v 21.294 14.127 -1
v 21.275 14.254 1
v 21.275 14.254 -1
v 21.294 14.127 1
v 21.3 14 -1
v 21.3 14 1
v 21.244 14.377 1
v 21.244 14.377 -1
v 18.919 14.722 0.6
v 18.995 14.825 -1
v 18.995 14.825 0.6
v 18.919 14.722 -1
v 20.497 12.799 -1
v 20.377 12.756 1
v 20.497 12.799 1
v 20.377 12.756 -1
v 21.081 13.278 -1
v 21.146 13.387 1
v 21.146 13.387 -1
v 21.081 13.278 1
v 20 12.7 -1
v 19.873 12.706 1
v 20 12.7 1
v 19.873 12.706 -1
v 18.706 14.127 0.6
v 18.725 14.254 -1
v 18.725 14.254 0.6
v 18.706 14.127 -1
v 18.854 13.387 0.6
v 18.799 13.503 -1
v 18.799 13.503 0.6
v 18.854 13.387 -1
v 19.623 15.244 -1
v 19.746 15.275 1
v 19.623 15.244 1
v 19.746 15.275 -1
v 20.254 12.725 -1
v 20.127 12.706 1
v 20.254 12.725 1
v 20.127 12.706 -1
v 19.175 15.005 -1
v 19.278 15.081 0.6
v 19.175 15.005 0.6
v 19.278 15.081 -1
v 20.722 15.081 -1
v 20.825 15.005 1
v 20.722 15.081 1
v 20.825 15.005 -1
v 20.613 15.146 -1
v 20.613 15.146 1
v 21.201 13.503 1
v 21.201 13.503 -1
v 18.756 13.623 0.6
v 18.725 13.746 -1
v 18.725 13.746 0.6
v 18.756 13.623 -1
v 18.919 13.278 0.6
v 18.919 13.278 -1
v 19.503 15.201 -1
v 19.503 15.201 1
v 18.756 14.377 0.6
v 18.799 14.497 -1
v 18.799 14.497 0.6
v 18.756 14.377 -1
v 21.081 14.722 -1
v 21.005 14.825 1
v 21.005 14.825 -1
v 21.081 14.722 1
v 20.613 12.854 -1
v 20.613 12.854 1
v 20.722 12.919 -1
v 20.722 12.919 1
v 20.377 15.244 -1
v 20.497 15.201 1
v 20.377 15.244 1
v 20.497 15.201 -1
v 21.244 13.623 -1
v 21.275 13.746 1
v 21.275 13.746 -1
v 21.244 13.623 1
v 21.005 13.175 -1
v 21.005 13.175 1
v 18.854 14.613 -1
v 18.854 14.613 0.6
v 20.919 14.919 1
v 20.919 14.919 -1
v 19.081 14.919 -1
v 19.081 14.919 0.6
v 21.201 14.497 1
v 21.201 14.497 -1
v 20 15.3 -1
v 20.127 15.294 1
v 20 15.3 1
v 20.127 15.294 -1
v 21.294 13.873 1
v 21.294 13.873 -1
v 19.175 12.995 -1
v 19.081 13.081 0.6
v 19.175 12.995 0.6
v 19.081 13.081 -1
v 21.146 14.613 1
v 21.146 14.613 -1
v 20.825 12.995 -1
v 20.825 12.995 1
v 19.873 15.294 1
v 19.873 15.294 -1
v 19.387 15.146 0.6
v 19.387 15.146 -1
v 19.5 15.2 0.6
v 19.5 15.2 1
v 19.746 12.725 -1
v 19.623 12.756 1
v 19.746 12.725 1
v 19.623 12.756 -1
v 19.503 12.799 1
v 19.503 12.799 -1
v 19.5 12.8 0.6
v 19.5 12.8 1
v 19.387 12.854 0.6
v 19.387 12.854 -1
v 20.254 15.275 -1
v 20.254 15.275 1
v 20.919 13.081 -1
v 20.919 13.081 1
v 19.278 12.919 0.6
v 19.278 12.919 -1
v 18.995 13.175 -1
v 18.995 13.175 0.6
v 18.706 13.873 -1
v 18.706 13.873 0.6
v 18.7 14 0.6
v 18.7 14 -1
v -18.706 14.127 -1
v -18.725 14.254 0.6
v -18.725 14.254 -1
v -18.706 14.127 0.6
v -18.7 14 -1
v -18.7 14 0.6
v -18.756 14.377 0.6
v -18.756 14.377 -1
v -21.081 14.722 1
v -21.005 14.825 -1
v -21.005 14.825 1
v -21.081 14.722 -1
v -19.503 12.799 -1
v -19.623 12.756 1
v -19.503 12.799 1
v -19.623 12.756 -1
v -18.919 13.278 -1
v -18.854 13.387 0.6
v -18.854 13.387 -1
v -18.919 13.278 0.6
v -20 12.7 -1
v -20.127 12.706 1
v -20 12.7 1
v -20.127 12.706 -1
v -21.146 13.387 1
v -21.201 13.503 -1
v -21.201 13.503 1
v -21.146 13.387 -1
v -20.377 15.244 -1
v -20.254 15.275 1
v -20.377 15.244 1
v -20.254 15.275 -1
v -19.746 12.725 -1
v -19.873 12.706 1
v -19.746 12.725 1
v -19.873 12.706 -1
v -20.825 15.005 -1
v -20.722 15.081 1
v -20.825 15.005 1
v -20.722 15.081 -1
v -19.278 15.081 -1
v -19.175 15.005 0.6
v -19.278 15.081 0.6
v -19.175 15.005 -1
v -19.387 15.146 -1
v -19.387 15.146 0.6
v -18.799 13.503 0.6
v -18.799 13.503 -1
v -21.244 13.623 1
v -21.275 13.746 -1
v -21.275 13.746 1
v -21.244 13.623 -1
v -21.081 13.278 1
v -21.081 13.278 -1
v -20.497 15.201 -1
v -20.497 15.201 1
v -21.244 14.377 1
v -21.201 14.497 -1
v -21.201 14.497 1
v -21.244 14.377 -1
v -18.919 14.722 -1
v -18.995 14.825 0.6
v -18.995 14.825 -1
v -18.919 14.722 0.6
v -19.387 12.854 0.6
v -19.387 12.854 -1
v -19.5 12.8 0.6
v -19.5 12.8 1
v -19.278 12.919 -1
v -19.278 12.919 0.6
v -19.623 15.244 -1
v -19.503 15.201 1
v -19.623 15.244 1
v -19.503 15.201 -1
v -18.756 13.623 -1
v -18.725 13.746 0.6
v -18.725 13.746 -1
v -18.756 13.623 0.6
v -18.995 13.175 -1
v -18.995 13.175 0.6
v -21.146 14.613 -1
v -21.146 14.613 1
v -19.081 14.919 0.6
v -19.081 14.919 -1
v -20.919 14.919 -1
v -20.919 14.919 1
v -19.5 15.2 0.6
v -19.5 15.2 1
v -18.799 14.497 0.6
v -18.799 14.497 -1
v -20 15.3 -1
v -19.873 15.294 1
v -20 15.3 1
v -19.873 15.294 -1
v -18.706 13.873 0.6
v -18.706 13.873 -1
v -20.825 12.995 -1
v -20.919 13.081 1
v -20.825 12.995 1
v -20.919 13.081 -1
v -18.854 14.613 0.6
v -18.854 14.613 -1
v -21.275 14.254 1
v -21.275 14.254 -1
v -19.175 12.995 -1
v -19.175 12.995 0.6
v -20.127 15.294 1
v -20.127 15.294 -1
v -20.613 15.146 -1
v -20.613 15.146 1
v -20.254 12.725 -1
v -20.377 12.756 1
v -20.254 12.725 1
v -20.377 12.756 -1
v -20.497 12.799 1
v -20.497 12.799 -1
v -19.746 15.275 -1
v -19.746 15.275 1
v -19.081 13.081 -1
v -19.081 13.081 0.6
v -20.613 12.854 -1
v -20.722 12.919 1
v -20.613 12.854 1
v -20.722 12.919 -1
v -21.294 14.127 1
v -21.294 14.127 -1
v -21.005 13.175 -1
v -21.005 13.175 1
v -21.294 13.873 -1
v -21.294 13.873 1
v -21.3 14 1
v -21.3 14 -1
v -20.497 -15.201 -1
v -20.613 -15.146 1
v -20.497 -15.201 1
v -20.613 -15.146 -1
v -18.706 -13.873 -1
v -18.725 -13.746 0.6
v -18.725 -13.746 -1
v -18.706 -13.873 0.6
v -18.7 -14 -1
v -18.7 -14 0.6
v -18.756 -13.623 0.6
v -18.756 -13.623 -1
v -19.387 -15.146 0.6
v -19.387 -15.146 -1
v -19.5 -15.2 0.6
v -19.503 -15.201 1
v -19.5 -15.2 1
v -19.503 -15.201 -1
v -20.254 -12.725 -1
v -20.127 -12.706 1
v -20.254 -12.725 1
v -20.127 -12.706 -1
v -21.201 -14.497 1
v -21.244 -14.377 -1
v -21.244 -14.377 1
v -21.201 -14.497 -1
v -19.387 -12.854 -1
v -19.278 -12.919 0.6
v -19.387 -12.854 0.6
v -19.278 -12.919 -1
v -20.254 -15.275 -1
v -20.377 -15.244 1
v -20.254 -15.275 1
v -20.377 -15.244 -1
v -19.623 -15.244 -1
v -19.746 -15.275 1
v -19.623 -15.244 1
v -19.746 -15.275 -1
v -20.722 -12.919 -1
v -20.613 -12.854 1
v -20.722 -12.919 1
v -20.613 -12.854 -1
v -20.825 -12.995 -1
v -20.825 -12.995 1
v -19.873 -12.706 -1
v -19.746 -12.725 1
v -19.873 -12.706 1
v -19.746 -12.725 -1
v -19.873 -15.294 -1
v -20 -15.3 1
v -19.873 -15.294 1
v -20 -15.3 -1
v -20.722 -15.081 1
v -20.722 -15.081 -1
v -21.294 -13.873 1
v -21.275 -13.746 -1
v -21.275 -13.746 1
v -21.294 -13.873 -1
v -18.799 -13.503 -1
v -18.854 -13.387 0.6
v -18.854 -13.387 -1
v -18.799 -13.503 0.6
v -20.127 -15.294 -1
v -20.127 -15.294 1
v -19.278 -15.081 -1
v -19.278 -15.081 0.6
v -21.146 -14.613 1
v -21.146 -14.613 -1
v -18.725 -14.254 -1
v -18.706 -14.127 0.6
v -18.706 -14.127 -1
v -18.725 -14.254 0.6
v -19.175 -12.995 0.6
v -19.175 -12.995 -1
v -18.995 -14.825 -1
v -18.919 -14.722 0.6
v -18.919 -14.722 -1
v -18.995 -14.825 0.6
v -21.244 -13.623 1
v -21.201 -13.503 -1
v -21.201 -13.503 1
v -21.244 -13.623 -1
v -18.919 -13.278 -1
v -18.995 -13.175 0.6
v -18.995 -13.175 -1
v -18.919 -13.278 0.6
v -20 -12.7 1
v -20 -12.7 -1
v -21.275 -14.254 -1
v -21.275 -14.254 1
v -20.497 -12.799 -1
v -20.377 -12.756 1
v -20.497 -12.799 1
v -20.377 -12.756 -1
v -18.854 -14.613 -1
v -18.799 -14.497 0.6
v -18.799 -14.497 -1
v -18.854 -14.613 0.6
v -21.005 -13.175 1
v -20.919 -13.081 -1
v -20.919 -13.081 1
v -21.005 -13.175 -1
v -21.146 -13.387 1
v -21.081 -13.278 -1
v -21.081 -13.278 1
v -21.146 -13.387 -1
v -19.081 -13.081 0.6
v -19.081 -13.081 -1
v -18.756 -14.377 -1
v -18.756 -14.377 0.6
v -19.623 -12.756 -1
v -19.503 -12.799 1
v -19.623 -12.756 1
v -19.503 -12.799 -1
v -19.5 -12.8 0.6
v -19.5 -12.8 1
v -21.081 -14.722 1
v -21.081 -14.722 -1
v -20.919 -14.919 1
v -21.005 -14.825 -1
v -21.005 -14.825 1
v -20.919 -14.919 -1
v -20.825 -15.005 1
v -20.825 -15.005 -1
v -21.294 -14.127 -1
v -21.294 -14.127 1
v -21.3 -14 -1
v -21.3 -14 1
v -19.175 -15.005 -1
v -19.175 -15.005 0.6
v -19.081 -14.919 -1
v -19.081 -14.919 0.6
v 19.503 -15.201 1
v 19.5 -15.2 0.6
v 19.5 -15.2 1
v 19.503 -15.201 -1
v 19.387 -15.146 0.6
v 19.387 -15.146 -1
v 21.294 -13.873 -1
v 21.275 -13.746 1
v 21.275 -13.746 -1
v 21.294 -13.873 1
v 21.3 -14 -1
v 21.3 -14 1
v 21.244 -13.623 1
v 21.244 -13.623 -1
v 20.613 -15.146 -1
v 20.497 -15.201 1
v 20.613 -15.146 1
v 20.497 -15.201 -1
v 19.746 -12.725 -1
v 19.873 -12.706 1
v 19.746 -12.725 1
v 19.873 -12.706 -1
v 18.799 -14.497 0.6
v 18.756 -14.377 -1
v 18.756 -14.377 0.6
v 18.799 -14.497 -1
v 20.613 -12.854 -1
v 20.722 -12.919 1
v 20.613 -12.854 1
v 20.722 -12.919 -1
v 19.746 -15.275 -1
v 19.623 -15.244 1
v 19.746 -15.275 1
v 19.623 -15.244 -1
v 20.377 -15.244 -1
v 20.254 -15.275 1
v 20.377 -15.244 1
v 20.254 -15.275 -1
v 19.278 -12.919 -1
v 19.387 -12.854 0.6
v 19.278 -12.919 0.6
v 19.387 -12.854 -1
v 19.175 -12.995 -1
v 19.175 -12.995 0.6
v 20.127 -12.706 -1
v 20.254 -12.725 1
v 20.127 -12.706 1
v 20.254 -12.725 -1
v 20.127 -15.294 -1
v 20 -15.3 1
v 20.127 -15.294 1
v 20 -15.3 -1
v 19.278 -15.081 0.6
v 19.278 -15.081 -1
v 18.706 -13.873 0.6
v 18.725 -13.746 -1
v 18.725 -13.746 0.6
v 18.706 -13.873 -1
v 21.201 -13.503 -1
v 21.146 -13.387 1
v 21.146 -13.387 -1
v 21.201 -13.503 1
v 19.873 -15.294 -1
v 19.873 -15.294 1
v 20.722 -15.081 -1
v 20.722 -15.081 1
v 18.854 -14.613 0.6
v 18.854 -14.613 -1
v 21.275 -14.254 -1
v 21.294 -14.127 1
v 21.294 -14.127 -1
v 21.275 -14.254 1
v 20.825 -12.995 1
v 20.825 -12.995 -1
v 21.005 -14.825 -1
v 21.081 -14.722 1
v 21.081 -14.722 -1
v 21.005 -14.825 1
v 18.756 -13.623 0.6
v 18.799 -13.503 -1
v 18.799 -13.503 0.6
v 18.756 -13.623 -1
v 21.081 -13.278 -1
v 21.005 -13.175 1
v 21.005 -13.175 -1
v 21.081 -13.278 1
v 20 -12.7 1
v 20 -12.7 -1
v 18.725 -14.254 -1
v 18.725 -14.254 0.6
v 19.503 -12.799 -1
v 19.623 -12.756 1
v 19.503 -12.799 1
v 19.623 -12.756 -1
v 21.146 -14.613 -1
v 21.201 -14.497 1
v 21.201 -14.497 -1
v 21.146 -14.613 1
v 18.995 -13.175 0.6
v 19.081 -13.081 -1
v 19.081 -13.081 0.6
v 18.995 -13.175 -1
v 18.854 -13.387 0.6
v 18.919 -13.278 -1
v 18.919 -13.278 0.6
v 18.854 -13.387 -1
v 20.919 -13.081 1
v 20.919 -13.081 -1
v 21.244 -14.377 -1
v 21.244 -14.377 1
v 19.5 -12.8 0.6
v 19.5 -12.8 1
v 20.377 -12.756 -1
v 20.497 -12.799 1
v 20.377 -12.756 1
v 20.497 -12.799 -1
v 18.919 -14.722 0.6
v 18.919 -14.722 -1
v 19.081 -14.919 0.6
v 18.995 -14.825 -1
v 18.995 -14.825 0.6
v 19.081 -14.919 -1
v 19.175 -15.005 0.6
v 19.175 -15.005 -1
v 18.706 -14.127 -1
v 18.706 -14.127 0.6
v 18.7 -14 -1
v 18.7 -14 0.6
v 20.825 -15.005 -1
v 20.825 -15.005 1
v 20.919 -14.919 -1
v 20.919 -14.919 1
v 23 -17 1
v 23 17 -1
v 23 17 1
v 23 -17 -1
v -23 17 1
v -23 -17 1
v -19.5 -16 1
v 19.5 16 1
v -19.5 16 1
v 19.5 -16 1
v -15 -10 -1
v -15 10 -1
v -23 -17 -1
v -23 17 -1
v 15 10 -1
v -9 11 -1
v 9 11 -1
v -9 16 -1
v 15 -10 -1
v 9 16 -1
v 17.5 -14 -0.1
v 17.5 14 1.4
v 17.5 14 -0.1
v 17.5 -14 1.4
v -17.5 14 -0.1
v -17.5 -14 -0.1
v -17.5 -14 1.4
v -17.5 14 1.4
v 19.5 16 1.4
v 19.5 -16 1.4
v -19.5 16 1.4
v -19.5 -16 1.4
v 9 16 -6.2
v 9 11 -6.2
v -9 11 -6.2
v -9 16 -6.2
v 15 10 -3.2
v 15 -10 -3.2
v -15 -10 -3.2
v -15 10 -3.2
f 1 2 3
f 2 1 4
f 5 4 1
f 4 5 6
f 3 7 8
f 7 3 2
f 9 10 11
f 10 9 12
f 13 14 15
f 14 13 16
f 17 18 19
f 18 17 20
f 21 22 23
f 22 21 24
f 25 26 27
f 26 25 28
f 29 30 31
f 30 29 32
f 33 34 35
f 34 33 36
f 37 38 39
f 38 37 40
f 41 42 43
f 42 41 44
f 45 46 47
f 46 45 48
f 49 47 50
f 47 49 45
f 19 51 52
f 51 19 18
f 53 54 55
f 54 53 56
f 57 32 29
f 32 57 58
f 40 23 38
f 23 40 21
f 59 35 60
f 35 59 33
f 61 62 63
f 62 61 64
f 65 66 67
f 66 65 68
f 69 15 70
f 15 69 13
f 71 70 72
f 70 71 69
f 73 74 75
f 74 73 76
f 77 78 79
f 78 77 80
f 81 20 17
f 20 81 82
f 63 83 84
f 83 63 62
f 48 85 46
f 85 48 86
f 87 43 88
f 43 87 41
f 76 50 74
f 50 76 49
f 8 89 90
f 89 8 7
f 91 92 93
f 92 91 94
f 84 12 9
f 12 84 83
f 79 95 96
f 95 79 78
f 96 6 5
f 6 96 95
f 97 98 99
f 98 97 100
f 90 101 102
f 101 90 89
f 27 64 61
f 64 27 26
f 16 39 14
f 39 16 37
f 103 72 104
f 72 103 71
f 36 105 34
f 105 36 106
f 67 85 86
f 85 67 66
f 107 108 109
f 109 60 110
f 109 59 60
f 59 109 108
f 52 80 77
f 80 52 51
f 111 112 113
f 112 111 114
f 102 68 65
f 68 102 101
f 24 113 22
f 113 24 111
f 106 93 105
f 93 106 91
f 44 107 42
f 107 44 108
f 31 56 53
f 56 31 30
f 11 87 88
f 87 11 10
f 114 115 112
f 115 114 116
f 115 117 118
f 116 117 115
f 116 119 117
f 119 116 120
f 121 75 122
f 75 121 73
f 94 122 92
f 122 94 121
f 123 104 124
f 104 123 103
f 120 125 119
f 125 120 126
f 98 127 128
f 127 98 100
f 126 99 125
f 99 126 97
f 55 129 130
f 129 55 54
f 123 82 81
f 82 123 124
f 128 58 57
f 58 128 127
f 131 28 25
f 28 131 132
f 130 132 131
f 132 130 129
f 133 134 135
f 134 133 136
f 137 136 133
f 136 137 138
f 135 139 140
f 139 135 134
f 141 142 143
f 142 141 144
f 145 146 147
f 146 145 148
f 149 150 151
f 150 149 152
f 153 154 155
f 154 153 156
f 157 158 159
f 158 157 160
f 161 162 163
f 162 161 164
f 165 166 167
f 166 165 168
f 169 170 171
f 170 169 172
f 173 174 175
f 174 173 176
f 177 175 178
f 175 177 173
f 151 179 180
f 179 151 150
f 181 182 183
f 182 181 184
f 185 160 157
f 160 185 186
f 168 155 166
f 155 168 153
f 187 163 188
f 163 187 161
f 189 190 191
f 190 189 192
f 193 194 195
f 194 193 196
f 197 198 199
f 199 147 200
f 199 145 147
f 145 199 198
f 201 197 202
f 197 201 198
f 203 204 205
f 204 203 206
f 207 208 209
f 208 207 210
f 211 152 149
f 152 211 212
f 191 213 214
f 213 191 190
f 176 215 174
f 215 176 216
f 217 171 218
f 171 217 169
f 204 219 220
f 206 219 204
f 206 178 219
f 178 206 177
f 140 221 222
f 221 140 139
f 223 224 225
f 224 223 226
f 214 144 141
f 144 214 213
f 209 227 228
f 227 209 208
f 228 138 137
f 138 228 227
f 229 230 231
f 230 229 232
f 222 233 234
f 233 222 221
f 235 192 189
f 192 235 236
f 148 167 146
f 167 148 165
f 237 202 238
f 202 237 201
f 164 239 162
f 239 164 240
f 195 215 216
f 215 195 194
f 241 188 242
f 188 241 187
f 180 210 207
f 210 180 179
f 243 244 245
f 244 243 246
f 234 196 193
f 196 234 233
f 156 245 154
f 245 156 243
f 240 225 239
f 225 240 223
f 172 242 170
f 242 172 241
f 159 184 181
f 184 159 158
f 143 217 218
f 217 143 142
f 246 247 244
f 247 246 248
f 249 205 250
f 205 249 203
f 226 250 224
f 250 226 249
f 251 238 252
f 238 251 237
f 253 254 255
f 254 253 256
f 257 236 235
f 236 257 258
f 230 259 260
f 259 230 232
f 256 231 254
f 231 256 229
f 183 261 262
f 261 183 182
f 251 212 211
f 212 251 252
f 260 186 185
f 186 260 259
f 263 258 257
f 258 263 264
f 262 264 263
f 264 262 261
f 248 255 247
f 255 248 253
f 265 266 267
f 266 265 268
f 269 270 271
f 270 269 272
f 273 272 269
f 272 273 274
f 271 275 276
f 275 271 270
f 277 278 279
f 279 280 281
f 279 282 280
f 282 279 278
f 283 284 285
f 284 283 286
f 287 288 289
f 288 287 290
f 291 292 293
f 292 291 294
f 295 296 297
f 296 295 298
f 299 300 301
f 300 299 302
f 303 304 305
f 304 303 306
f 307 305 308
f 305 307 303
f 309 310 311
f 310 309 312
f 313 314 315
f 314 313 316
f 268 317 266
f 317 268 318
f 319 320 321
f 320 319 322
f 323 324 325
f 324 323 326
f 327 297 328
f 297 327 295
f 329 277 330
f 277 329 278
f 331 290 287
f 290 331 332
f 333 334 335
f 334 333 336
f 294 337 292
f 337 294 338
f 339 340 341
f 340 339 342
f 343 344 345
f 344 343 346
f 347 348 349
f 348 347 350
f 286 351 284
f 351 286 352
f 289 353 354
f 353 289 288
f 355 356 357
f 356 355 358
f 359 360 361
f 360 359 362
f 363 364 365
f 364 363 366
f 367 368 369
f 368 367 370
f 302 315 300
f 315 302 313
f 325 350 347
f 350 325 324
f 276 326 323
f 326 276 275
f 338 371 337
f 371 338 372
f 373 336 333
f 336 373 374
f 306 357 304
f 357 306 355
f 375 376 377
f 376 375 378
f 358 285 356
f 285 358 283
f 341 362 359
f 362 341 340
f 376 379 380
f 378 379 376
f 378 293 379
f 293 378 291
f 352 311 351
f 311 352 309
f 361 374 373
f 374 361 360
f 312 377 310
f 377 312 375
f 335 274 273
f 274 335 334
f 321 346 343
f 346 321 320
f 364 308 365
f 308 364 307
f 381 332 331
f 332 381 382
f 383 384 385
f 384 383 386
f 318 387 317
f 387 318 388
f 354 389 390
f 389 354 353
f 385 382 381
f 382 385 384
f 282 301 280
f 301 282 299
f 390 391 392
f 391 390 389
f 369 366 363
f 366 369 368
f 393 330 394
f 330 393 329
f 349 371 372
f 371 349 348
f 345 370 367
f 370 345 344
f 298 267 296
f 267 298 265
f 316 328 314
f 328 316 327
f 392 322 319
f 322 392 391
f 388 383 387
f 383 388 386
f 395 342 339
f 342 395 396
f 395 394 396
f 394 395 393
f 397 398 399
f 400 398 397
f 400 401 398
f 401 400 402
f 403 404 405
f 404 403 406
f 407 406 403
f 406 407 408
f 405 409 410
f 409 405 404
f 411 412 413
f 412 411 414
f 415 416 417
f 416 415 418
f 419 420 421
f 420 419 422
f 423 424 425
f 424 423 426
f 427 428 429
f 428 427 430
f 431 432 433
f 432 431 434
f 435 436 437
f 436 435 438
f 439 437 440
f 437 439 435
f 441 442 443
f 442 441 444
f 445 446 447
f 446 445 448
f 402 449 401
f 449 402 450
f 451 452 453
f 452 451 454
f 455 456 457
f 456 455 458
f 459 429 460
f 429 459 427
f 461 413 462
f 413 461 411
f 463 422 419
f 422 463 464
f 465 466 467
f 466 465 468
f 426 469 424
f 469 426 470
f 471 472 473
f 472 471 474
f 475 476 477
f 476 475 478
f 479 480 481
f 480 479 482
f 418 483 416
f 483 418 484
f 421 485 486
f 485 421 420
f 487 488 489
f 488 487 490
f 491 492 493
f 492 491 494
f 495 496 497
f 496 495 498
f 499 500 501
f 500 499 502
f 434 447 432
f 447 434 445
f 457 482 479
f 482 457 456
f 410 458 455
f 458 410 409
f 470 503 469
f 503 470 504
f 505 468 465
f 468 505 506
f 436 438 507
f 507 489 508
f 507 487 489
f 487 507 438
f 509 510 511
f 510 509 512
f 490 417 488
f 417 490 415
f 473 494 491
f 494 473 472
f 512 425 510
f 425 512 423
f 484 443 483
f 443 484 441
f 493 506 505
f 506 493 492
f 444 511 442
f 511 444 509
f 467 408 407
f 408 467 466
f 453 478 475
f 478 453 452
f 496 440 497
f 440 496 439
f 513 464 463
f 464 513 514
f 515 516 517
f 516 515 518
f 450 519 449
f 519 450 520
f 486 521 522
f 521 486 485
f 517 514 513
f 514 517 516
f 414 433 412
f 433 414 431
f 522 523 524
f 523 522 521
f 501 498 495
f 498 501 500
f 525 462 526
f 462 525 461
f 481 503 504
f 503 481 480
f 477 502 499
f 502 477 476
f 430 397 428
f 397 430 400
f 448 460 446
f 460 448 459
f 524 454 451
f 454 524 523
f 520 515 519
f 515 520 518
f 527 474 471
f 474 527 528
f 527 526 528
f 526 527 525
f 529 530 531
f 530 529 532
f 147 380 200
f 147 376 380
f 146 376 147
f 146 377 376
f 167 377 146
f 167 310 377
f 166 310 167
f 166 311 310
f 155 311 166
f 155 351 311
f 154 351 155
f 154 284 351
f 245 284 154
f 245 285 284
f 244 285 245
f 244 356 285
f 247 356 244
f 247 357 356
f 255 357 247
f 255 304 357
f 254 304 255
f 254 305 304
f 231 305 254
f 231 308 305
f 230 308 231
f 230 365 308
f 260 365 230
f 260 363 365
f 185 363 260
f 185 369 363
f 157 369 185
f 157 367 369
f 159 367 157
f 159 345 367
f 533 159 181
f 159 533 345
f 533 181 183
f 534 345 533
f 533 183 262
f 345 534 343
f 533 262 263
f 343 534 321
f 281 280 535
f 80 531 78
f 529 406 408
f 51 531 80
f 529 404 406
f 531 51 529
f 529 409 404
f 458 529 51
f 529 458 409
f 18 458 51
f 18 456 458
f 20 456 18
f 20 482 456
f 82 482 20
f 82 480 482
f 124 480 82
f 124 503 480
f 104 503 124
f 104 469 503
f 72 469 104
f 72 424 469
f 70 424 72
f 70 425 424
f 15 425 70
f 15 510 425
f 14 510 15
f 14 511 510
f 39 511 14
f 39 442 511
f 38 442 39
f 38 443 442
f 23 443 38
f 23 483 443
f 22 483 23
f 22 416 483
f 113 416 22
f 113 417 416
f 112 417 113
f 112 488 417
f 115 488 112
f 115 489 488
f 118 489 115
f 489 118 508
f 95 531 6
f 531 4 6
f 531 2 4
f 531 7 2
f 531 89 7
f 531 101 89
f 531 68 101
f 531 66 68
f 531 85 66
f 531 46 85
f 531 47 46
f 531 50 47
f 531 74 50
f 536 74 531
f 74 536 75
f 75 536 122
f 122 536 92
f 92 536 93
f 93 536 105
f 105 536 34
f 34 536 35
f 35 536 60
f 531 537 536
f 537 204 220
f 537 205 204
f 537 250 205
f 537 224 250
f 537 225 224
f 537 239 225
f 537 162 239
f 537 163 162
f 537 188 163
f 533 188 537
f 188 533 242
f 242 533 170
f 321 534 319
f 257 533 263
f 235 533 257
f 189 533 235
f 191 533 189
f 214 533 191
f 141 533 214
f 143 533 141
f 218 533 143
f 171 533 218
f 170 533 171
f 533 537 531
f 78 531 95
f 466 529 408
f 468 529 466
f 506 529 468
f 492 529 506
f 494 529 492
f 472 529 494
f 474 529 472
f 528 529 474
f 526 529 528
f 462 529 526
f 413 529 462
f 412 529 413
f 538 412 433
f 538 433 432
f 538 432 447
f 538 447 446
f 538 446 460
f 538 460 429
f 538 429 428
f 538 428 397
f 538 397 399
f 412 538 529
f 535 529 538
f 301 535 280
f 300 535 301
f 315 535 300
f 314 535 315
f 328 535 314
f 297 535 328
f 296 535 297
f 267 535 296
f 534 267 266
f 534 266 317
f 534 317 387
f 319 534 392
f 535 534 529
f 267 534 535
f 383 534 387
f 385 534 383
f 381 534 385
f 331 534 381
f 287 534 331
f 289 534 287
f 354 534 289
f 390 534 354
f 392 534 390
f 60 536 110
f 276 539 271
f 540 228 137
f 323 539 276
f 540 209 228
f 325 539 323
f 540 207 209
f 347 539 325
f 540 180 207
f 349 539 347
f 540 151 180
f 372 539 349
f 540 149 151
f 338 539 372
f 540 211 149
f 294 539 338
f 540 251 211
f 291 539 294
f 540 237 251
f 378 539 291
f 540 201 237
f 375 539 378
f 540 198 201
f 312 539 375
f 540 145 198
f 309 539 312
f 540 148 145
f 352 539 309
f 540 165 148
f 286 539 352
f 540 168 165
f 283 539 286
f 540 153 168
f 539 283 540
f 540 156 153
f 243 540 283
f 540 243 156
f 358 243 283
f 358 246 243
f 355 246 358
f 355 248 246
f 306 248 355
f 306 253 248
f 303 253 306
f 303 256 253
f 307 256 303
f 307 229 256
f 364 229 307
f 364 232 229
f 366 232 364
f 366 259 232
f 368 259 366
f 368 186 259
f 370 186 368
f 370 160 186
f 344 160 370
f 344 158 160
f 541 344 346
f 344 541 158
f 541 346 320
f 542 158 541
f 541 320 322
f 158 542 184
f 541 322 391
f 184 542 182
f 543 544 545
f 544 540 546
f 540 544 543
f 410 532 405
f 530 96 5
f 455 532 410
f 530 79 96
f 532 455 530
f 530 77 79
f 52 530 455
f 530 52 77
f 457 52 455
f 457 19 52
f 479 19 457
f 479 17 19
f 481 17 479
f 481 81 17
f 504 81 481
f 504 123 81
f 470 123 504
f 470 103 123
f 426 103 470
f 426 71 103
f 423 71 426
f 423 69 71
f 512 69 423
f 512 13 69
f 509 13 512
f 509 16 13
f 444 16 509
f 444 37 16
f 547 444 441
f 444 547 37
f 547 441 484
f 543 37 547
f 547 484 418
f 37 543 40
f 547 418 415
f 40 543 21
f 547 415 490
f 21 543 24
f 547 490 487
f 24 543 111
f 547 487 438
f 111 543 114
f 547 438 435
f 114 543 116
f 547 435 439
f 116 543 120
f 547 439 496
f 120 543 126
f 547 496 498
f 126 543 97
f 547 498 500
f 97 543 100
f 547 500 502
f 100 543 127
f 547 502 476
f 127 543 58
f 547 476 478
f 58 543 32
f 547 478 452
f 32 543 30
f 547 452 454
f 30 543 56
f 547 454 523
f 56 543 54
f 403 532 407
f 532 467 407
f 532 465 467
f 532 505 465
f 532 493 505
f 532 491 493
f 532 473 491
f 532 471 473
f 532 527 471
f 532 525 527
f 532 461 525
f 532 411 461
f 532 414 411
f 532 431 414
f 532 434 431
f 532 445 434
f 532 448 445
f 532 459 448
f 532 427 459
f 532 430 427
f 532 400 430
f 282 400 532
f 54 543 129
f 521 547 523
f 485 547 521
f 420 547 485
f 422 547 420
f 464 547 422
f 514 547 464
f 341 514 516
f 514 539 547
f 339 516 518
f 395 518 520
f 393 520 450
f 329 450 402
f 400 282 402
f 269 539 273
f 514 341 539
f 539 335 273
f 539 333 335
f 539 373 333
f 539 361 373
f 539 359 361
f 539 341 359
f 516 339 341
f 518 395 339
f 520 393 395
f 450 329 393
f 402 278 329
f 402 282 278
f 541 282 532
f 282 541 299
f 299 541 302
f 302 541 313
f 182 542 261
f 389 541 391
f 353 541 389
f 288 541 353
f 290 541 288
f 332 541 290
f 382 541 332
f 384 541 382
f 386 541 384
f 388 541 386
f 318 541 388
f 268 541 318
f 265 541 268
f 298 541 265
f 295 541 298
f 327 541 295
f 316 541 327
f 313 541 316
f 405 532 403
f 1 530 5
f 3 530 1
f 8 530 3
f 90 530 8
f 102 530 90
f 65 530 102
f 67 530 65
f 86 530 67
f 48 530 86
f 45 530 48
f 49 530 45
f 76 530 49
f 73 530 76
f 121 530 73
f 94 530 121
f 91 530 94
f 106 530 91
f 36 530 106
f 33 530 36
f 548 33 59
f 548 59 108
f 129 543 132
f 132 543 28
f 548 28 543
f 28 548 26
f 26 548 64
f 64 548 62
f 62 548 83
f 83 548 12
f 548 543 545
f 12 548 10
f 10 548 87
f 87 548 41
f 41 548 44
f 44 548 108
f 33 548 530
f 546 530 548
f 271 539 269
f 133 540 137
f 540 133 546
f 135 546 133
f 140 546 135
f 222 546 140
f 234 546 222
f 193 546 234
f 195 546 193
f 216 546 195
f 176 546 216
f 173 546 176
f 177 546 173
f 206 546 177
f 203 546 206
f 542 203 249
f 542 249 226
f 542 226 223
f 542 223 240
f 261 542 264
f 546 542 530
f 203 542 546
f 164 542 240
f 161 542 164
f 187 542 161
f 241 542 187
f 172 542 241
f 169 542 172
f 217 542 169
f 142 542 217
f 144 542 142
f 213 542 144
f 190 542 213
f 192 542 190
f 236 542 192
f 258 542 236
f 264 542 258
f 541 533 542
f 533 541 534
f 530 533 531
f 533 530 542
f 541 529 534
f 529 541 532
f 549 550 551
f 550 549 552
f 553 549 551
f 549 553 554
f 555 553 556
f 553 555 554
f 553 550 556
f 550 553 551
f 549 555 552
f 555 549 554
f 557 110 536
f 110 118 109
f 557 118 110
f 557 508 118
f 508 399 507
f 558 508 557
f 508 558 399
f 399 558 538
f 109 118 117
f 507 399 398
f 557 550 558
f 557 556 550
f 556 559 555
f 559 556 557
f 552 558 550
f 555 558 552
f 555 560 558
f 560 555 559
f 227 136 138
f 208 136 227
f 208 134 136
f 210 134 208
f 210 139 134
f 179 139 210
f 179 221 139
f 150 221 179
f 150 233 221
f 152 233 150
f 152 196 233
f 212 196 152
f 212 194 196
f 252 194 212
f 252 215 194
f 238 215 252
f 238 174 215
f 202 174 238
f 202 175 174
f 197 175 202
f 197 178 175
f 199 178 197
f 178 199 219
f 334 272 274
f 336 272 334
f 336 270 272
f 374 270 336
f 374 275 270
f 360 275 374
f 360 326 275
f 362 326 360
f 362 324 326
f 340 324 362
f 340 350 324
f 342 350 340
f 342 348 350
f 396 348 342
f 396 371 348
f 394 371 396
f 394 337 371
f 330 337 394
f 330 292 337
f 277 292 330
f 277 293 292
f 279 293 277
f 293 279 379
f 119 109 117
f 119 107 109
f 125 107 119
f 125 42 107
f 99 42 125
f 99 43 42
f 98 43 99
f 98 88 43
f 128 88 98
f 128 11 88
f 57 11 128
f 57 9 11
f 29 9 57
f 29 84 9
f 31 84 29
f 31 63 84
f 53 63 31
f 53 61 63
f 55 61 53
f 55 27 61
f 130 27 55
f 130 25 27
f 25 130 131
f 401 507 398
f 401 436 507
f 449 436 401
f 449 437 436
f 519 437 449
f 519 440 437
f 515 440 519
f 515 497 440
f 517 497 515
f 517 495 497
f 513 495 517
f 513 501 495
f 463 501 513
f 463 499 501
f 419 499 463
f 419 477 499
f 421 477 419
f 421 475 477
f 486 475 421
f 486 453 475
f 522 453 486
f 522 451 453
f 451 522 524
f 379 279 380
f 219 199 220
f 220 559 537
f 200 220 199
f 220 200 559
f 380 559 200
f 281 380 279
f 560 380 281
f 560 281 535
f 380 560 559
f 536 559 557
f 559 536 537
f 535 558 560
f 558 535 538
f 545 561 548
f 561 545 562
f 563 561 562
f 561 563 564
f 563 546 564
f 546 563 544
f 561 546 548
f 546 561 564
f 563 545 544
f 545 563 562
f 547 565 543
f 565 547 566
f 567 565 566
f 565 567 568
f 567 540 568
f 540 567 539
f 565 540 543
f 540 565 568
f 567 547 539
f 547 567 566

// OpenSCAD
$fn = 64;

// =====================
// Parameters (mm)
// =====================
module_L = 46.0;          // overall PCB length (X)
module_W = 34.0;          // overall PCB width  (Y)
module_T = 2.0;           // PCB thickness (Z)

screen_L = 35.0;          // visible/active window size (X)
screen_W = 28.0;          // visible/active window size (Y)
screen_recess = 0.3;      // shallow recess on top surface

bezel_wall = 2.0;         // bezel frame wall thickness around window
bezel_height = 0.8;       // bezel height above PCB

hole_d = 2.6;
hole_edge_margin = 3.0;

header_L = 18.0;
header_W = 5.0;
header_H = 6.0;
header_inset = 1.0;

keepout_L = 30.0;
keepout_W = 20.0;
keepout_H = 3.0;

overlap = 0.8;            // intentional overlap to guarantee connectivity

// =====================
// Helpers
// =====================
module mount_hole(x, y) {
    translate([x, y, 0])
        cylinder(h = module_T + 4*overlap, r = hole_d/2, center = true);
}

module mounting_holes() {
    union() {
        mount_hole( module_L/2 - hole_edge_margin,  module_W/2 - hole_edge_margin);
        mount_hole(-module_L/2 + hole_edge_margin,  module_W/2 - hole_edge_margin);
        mount_hole(-module_L/2 + hole_edge_margin, -module_W/2 + hole_edge_margin);
        mount_hole( module_L/2 - hole_edge_margin, -module_W/2 + hole_edge_margin);
    }
}

// =====================
// Main solids (all connected)
// =====================
module pcb_with_features() {
    difference() {
        // PCB
        cube([module_L, module_W, module_T], center = true);

        // Mounting holes
        mounting_holes();

        // Shallow top recess to suggest LCD active area (NOT a through-cut)
        translate([0, 0, module_T/2 - screen_recess/2])
            cube([screen_L, screen_W, screen_recess + 2*overlap], center = true);
    }
}

module bezel_frame() {
    // Bezel sits on top of PCB and overlaps slightly into it for a single connected solid
    bezel_outer_L = screen_L + 2*bezel_wall;
    bezel_outer_W = screen_W + 2*bezel_wall;

    translate([0, 0, module_T/2 + bezel_height/2 - overlap/2])
    difference() {
        cube([bezel_outer_L, bezel_outer_W, bezel_height], center = true);
        // Window cut through bezel only
        cube([screen_L, screen_W, bezel_height + 4*overlap], center = true);
    }
}

module connector_header() {
    // Header on bottom side, inset from one PCB edge; overlaps into PCB for connectivity
    translate([
        0,
        module_W/2 - header_W/2 - header_inset,
        -module_T/2 - header_H/2 + overlap
    ])
        cube([header_L, header_W, header_H], center = true);
}

module back_components_keepout() {
    // Back-side component block; overlaps into PCB for connectivity
    translate([0, 0, -module_T/2 - keepout_H/2 + overlap])
        cube([keepout_L, keepout_W, keepout_H], center = true);
}

// =====================
// Final connected model
// =====================
union() {
    pcb_with_features();
    bezel_frame();
    connector_header();
    back_components_keepout();
}
